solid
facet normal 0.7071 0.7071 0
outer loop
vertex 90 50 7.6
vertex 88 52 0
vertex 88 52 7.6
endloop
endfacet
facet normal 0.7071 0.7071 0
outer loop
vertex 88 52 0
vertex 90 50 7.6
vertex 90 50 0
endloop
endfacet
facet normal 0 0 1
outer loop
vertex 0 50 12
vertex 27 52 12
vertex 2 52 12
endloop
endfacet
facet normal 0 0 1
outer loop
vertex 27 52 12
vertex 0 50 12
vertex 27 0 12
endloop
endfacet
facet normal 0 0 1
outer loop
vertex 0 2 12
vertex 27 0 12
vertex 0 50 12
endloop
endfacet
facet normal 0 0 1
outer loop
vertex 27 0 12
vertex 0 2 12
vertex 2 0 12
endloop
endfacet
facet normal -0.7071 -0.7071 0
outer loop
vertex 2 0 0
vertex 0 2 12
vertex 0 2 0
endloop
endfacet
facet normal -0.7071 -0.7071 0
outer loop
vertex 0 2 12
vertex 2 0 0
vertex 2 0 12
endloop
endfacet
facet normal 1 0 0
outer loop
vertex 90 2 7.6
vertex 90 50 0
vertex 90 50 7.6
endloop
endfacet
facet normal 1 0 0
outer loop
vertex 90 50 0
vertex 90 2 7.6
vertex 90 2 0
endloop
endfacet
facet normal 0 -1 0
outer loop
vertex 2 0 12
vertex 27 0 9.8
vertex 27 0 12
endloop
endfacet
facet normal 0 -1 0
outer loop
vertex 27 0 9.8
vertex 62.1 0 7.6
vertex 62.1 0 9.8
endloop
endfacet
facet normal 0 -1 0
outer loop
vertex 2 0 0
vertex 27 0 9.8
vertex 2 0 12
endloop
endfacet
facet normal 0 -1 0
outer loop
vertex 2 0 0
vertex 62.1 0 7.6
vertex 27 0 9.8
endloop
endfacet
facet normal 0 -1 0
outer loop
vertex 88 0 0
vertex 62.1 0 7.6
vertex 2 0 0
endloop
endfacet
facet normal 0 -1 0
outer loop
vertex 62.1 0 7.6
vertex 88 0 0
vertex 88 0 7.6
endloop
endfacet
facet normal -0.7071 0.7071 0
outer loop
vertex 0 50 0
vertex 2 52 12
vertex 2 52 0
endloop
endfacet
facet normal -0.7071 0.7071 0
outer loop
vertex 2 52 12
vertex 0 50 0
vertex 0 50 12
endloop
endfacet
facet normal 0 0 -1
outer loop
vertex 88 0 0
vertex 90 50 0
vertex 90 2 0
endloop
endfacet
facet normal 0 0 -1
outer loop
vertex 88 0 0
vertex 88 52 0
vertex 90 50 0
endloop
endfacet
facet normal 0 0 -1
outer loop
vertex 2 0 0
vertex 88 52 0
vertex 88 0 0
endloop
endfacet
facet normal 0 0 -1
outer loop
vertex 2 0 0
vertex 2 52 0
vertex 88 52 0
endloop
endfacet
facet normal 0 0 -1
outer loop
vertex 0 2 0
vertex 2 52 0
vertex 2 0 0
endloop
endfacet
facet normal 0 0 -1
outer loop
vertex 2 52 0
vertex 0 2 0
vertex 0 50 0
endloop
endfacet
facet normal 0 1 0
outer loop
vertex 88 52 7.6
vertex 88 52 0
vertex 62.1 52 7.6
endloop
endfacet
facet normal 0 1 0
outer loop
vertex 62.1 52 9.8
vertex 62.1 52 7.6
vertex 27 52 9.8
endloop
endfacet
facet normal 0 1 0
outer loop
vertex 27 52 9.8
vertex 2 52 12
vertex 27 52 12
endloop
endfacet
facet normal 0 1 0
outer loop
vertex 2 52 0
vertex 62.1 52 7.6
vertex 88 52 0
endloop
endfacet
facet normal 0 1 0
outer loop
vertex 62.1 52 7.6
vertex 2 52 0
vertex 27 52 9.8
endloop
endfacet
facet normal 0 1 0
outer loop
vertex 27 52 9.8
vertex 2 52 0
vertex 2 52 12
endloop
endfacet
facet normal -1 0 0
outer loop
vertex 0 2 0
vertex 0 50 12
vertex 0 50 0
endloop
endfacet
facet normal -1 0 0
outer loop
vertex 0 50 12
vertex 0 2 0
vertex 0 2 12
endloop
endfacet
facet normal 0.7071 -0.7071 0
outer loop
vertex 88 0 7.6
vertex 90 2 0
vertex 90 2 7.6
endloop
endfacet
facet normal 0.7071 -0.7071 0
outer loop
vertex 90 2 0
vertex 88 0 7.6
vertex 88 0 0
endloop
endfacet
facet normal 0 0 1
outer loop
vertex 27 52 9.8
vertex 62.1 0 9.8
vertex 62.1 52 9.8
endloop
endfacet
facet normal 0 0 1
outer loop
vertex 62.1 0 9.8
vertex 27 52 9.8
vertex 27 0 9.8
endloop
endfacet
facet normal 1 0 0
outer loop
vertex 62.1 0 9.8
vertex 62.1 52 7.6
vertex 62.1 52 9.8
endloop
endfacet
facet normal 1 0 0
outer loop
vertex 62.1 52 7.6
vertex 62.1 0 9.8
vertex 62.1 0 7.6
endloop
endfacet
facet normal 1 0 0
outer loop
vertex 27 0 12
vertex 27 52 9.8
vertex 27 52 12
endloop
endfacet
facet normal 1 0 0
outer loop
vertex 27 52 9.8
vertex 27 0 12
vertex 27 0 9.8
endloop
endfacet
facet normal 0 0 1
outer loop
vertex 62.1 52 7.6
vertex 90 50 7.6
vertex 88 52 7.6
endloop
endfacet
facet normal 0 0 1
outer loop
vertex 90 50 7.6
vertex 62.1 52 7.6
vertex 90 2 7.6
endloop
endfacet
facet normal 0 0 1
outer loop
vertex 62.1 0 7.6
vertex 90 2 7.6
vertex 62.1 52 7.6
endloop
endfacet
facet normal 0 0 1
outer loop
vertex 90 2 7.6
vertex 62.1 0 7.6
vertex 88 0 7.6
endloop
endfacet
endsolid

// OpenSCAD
$fn = 32;

// ----------------------------------------------------------------------
// Stepped bar: twostep, 90 x 52 x 12/7.6 mm
// ----------------------------------------------------------------------

// --- parameters (mm) ---
bar_l = 90;               // bar length, X
bar_w = 52;               // bar width, Y
plate_t = 12;             // thickness of the thick zone, Z
thin_t = 7.6;             // thickness of the thin zone
corner_c = 2;             // corner chamfer of the bar
step_cut = 4.4;           // material removed from the thin zone
stair1_x = 27;            // position of the first stair
stair2_x = 62.1;          // position of the second stair
mid_t = 9.8;              // thickness of the middle zone
depth_1 = 2.2;            // depth of cut 1 from the top face
depth_2 = 4.4;            // depth of cut 2 from the top face

profile = [[2, 0], [88, 0], [90, 2], [90, 50], [88, 52], [2, 52], [0, 50], [0, 2]];  // primary outline, 8 points, counter clockwise
void_1 = [[27, -1], [62.1, -1], [62.1, 53], [27, 53]];  // first stair, 4 points
void_2 = [[62.1, -1], [91, -1], [91, 53], [62.1, 53]];  // second stair, 4 points

// --- the one profile operation ---
difference() {
  linear_extrude(height = plate_t) polygon(points = profile);
  translate([0, 0, plate_t - depth_1])
    linear_extrude(height = depth_1 + 1) polygon(points = void_1);
  translate([0, 0, plate_t - depth_2])
    linear_extrude(height = depth_2 + 1) polygon(points = void_2);
}
